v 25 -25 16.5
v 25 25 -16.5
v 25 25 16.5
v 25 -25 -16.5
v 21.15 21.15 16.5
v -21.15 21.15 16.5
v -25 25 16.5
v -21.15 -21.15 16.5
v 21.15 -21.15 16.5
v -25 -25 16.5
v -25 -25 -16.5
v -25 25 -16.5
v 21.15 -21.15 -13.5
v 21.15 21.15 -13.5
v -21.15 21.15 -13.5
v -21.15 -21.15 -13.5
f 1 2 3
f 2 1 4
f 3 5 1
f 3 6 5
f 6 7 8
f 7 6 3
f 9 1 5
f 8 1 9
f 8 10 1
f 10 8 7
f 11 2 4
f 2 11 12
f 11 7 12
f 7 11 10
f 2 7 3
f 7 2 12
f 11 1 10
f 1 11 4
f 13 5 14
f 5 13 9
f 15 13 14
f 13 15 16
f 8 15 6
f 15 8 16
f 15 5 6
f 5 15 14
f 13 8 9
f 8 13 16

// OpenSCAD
Height=33; //[5:1:100]
X=42.3; //[5:1:100]
Y=42.3; //[5:1:100]

difference() {
        
    cube([50,50,Height],center=true);
    translate([0,0,3])
    cube([X,Y,Height],center=true);
}
